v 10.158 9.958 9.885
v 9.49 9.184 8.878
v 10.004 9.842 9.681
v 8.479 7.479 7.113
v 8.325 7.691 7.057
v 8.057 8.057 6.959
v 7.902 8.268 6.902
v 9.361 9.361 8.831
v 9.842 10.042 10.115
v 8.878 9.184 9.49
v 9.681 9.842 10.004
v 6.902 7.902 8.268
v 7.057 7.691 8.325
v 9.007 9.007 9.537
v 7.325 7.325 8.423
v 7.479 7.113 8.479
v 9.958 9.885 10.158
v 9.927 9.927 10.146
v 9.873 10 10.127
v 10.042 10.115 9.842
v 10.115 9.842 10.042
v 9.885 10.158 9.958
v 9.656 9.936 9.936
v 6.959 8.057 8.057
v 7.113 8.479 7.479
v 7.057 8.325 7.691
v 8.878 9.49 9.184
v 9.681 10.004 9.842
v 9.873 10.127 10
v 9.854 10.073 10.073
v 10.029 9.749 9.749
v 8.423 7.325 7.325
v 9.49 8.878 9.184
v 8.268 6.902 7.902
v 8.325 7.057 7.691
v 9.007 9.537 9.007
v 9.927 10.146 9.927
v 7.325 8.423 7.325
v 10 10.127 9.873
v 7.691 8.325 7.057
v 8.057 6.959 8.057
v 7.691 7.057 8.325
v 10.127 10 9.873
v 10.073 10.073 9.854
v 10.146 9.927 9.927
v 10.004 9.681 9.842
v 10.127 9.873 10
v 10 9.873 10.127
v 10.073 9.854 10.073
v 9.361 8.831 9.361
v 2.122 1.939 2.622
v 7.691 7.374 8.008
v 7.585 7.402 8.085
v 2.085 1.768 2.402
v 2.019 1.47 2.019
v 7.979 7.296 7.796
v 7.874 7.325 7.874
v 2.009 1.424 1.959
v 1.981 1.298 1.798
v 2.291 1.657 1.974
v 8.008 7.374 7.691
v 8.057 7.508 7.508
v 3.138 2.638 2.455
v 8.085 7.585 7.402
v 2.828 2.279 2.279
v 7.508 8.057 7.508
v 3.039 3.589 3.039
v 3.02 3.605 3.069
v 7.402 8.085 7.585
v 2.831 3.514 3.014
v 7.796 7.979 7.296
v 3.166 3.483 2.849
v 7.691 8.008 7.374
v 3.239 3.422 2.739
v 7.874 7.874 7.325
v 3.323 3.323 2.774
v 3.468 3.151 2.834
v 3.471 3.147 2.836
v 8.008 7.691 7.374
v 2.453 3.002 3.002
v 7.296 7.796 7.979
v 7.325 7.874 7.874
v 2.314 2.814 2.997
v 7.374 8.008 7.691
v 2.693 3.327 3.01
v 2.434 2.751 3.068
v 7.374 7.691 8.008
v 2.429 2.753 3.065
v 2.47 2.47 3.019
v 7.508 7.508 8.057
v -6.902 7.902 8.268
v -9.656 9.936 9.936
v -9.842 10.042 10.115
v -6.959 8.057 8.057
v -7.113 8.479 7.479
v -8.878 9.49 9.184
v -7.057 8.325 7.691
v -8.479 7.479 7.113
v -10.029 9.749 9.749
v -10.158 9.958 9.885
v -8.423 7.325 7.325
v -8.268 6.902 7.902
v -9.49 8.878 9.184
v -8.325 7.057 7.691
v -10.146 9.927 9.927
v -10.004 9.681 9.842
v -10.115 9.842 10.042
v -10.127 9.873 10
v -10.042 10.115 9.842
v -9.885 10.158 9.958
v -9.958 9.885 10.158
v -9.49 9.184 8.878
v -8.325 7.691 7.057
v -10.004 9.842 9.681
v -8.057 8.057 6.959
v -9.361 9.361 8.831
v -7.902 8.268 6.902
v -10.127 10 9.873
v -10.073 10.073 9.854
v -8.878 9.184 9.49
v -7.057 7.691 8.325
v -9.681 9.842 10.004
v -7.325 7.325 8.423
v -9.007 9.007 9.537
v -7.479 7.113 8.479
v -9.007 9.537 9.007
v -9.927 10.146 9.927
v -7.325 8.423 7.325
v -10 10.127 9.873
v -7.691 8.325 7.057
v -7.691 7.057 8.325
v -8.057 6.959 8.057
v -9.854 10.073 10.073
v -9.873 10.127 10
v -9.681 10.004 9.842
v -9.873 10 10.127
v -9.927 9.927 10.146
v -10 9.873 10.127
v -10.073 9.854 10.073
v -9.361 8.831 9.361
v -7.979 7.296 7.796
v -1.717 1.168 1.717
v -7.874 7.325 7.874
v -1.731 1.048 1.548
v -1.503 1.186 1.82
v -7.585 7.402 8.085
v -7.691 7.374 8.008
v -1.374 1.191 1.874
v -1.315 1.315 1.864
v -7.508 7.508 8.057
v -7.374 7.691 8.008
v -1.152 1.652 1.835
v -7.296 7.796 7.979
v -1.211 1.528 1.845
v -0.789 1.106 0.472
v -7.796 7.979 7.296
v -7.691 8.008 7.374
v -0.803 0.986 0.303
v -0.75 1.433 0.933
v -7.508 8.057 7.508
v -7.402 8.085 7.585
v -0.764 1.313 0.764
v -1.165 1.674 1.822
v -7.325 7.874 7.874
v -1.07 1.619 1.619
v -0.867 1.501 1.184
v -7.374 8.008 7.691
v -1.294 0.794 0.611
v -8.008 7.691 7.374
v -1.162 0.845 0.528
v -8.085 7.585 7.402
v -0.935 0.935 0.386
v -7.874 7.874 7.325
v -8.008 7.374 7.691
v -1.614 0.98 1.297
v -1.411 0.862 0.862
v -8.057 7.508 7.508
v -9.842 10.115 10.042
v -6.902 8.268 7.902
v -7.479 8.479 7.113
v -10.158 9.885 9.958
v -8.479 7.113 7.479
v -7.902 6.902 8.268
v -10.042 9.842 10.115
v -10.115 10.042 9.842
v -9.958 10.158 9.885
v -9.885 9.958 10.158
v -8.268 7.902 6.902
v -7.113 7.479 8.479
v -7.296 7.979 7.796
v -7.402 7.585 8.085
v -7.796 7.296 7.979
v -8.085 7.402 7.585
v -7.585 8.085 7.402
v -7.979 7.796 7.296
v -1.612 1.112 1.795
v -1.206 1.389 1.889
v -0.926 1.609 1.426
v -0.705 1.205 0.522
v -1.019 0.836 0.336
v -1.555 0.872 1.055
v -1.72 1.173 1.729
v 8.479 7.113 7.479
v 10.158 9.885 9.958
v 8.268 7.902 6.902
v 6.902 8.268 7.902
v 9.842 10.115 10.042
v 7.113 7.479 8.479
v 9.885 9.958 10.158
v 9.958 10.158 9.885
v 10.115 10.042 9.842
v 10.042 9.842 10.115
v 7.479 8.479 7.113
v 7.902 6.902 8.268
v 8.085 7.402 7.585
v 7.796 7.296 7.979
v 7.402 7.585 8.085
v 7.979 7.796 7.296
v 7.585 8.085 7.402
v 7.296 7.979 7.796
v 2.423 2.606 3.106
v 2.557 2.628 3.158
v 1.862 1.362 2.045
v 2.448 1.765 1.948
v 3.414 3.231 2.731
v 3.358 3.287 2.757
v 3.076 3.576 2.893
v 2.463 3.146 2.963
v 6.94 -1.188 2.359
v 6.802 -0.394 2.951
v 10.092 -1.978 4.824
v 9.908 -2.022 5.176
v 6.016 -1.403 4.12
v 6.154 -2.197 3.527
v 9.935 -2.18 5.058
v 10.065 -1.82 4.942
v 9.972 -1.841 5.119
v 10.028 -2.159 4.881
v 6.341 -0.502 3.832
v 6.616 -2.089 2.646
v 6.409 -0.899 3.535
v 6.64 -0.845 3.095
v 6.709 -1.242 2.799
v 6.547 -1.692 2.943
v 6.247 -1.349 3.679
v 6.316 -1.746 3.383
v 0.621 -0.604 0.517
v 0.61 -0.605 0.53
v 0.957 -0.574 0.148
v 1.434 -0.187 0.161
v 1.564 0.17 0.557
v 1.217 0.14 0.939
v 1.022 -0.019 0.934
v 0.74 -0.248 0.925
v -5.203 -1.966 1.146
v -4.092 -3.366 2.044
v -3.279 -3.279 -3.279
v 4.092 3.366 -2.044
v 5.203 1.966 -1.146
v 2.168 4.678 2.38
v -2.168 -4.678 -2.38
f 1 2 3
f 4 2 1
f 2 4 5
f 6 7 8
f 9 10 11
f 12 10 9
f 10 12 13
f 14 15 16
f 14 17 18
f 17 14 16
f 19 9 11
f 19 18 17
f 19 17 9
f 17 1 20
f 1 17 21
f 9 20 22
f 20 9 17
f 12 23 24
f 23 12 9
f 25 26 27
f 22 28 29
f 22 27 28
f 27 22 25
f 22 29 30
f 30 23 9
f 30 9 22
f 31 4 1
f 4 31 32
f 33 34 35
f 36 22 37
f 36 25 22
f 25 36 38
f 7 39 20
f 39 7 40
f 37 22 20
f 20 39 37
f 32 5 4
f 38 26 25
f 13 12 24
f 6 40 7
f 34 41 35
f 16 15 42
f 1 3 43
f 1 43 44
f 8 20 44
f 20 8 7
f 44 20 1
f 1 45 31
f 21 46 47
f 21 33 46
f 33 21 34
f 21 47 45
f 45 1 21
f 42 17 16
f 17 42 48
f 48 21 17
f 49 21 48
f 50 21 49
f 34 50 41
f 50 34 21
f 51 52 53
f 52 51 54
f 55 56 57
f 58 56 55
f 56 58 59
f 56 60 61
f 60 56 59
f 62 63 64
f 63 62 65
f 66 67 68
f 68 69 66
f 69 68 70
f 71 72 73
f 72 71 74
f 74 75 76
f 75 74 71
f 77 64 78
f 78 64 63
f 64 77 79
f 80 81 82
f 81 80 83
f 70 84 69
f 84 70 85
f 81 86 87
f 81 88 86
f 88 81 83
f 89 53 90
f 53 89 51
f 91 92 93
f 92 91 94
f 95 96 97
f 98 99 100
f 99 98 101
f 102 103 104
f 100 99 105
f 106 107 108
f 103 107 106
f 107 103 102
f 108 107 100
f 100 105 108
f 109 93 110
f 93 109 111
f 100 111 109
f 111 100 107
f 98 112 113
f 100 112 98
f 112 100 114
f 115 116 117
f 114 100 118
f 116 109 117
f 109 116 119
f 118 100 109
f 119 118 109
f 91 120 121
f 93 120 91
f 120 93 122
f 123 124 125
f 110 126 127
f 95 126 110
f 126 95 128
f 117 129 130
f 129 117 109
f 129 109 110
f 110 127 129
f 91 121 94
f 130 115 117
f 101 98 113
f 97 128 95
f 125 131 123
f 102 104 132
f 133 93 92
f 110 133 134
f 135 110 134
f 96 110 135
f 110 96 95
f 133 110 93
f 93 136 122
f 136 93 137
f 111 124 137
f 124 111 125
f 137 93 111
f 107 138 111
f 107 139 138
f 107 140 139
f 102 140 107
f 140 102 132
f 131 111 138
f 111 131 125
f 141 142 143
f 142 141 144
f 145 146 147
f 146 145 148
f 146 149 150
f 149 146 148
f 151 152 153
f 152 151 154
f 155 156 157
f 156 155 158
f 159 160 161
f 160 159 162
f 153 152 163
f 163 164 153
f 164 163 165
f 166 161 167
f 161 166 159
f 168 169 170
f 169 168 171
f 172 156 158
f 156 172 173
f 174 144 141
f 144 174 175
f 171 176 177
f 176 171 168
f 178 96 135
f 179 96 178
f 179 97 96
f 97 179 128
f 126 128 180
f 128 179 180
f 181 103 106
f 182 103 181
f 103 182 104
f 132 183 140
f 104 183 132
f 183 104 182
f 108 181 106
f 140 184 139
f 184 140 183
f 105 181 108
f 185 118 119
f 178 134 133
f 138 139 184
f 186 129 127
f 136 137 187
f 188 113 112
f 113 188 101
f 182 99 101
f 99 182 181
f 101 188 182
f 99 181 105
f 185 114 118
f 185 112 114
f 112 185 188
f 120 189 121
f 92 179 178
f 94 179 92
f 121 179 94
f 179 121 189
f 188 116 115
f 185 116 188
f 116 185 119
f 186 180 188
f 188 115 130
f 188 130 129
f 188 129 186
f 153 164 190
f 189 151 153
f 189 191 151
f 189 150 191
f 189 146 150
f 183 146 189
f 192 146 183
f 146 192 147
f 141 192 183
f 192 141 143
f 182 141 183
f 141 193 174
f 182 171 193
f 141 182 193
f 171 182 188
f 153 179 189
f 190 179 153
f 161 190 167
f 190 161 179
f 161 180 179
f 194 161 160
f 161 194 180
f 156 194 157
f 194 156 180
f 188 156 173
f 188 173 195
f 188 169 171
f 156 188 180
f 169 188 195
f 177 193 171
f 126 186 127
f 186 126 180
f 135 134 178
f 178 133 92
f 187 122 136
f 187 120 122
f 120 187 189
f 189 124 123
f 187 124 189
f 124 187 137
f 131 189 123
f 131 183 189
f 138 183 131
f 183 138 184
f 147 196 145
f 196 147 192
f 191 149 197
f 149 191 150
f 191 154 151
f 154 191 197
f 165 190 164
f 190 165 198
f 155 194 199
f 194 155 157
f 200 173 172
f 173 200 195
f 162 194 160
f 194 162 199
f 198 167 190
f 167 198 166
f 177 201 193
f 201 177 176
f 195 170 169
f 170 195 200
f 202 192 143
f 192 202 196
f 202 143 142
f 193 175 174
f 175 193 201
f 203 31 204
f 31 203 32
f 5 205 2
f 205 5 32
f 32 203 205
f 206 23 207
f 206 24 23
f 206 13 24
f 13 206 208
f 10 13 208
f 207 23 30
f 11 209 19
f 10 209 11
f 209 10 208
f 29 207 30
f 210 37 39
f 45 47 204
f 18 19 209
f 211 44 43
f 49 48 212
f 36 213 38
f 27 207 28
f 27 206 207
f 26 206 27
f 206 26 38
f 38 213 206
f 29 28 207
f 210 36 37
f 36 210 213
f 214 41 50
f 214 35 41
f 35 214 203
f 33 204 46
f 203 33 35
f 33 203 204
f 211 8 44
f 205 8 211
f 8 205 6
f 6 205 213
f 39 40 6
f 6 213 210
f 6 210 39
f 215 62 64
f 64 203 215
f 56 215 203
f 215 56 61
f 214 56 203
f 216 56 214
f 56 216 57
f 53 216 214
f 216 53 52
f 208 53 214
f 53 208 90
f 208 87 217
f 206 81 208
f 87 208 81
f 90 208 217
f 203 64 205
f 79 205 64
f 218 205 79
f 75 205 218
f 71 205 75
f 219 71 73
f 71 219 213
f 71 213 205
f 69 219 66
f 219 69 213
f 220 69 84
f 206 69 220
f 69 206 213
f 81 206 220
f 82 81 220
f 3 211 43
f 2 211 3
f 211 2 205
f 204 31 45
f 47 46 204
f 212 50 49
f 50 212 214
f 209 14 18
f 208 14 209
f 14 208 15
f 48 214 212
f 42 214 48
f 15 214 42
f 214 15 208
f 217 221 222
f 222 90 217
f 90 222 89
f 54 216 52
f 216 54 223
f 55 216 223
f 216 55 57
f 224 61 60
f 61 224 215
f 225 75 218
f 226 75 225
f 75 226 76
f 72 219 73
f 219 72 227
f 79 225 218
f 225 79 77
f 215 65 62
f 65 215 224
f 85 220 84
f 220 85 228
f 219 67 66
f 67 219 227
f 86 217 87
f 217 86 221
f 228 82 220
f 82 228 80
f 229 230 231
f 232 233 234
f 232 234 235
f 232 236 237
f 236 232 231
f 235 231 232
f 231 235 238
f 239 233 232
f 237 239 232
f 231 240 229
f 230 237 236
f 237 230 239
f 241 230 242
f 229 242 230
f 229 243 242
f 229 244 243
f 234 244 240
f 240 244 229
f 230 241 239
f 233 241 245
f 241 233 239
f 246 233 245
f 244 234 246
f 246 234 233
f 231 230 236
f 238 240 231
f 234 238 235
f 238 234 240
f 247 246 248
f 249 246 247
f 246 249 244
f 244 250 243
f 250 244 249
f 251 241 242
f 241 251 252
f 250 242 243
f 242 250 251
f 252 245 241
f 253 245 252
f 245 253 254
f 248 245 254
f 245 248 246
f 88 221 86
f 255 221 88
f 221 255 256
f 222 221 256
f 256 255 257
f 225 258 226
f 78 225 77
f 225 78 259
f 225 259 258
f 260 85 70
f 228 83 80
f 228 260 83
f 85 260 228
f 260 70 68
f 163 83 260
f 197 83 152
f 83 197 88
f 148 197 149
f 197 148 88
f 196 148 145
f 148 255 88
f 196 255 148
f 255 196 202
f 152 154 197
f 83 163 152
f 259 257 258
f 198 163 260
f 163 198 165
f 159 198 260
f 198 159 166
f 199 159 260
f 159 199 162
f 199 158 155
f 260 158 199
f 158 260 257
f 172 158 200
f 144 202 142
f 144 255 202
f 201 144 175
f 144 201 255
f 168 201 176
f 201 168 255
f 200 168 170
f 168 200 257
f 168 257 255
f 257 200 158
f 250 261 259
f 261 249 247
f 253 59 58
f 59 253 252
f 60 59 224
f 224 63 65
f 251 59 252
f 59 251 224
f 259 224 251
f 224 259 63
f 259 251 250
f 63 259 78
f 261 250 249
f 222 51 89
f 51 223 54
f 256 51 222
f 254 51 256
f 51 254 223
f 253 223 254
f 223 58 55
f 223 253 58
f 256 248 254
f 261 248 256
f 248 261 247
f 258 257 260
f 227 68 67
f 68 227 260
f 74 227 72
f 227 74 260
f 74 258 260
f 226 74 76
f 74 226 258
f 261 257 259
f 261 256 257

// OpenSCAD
//---------------------------------------------------------------
//-- Openscad vector library
//-- This is a component of the obiscad opescad tools by Obijuan
//-- (C) Juan Gonzalez-Gomez (Obijuan)
//-- Sep-2012
//---------------------------------------------------------------
//-- Released under the GPL license
//---------------------------------------------------------------

obiscad_drawing_resolution = 6;

//----------------------------------------
//-- FUNCTIONS FOR WORKING WITH VECTORS
//----------------------------------------

//-- Calculate the module of a vector
function mod(v) = (sqrt(v[0]*v[0]+v[1]*v[1]+v[2]*v[2]));

//-- Calculate the cros product of two vectors
function cross(u,v) = [
  u[1]*v[2] - v[1]*u[2],
  -(u[0]*v[2] - v[0]*u[2]) ,
  u[0]*v[1] - v[0]*u[1]];

//-- Calculate the dot product of two vectors
function dot(u,v) = u[0]*v[0]+u[1]*v[1]+u[2]*v[2];

//-- Return the unit vector of a vector
function unitv(v) = v/mod(v);

//-- Return the angle between two vectores
function anglev(u,v) = acos( dot(u,v) / (mod(u)*mod(v)) );

//-- Return an arbitrary unitary vector othogonal to v
function orthounit2(v) = (v.x == 0 && v.y == 0 && v.z ==0 ) ? undef : (v.x == 0 && v.y == 0) ? [1,0,0] : let (r=norm([v.x, v.y, 0])) [v.y/r, -v.x/r, 0];

//-- Return an arbitrary vector othogonal to v
function ortho2(v) = (v.x == 0 && v.y == 0 && v.z== 0) ? undef : (v.x == 0 && v.y == 0) ? [1,0,0] : (v.y == 0) ? [1,0,0] : [1, -v.x/v.y, 0];

//----------------------------------------------------------
//--  Draw a point in the position given by the vector p  
//----------------------------------------------------------
module point(p)
{
  translate(p)
    sphere(r=0.7,$fn=obiscad_drawing_resolution);
}

//------------------------------------------------------------------
//-- Draw a vector poiting to the z axis
//-- This is an auxiliary module for implementing the vector module
//--
//-- Parameters:
//--  l: total vector length (line + arrow)
//--  l_arrow: Vector arrow length
//--  mark: If true, a mark is draw in the vector head, for having
//--    a visual reference of the rolling angle
//------------------------------------------------------------------
module vectorz(l=10, l_arrow=4, mark=false)
{
  //-- vector body length (not including the arrow)
  lb = l - l_arrow;

  //-- The vector is locatead at 0,0,0
  translate([0,0,lb/2])
  union() {

    //-- Draw the arrow
    translate([0,0,lb/2])
      cylinder(r1=2/2, r2=0.2, h=l_arrow, $fn=obiscad_drawing_resolution);

    //-- Draw the mark
    if (mark) {
      translate([0,0,lb/2+l_arrow/2])
      translate([1,0,0])
        cube([2,0.3,l_arrow*0.8],center=true);
    }

    //-- Draw the body
    cylinder(r=1/2, h=lb, center=true, $fn=obiscad_drawing_resolution);
  }

  //-- Draw a sphere in the vector base
  sphere(r=1/2, $fn=obiscad_drawing_resolution);
}

//-----------------------------------------------------------------
//-- ORIENTATE OPERATOR
//--
//--  Orientate an object to the direction given by the vector v
//--  Parameters:
//--    v : Target orientation
//--    vref: Vector reference. It is the vector of the local frame
//--          of the object that want to be poiting in the direction
//--          of v
//--    roll: Rotation of the object around the v axis
//-------------------------------------------------------------------
module orientate(v,vref=[0,0,1], roll=0)
{
  //-- Calculate the rotation axis
  cref = cross(vref, v);
  raxis = mod(cref) == 0 ? [1,0,0] : cref;
  
  //-- Calculate the angle between the vectors
  ang = anglev(vref,v);

  //-- Rotate the child!
  rotate(a=roll, v=v)
    rotate(a=ang, v=raxis)
      children(0);
}

//---------------------------------------------------------------------------
//-- Draw a vector 
//--
//-- There are two modes of drawing the vector
//-- * Mode 1: Given by a cartesian point(x,y,z). A vector from the origin
//--           to the end (x,y,z) is drawn. The l parameter (length) must 
//--           be 0  (l=0)
//-- * Mode 2: Give by direction and length
//--           A vector of length l pointing to the direction given by
//--           v is drawn
//---------------------------------------------------------------------------
//-- Parameters:
//--  v: Vector cartesian coordinates
//--  l: total vector length (line + arrow)
//--  l_arrow: Vector arrow length
//    mark: If true, a mark is draw in the vector head, for having
//--    a visual reference of the rolling angle
//---------------------------------------------------------------------------
module vector(v,l=0, l_arrow=4, mark=false)
{
  //-- Get the vector length from the coordinates
  mod = mod(v);

  //-- The vector is very easy implemented by means of the orientate
  //-- operator:
  //--  orientate(v) vectorz(l=mod, l_arrow=l_arrow)
  //--  BUT... in OPENSCAD 2012.02.22 the recursion does not
  //--    not work, so that if the user use the orientate operator
  //--    on a vector, openscad will ignore it..
  //-- The solution at the moment (I hope the openscad developers
  //--  implement the recursion in the near future...)
  //--  is to repite the orientate operation in this module

  //---- SAME CALCULATIONS THAN THE ORIENTATE OPERATOR!
  //-- Calculate the rotation axis

  vref = [0,0,1];
  cref = cross(vref, v);
  raxis = mod(cref) == 0 ? [1,0,0] : cref;
  
  //-- Calculate the angle between the vectors
  ang = anglev(vref,v);

  //-- orientate the vector
  //-- Draw the vector. The vector length is given either
  //--- by the mod variable (when l=0) or by l (when l!=0)
  if (l==0)
    rotate(a=ang, v=raxis)
      vectorz(l=mod, l_arrow=l_arrow, mark=mark);
  else
    rotate(a=ang, v=raxis)
      vectorz(l=l, l_arrow=l_arrow, mark=mark);

}

//----------------------------------------------------
//-- Draw a Frame of reference
//-- Parameters:
//-- l: length of the Unit vectors
//-----------------------------------------------------
module frame(l=10, l_arrow=4)
{

  //-- Z unit vector
  color("Blue")
    vector([0,0,l], l_arrow=l_arrow);

  //-- X unit vector
  color("Red")
    vector([l,0,0], l_arrow=l_arrow );

  //-- Y unit vector
  color("Green")
    vector([0,l,0],l_arrow=l_arrow);

  //-- Origin
  color("Gray")
    sphere(r=1, $fn=obiscad_drawing_resolution);
}

//--------------------------------------------------
//-- Modules for testings and examples
//-- Testing that the vector library is working ok
//--------------------------------------------------

//-- 22 vectors in total are drawn, poiting to different directions
module Test_vectors1()
{

  a = 20;
  k = 1;

  //--  Add a frame of reference (in the origin)
  frame(l=a);

  //-- Negative vectors, pointing towards the three axis: -x, -y, -z
  color("Red")   vector([-a, 0,  0]);
  color("Green") vector([0, -a,  0]);
  color("Blue")  vector([0,  0, -a]);

  //-- It is *not* has been implemented using a for loop on purpose
  //-- This way, individual vectors can be commented out or highlighted

  //-- vectors with positive z
  vector([a,   a, a*k]);
  vector([0,   a, a*k]);
  vector([-a,  a, a*k]);
  vector([-a,  0, a*k]);

  vector([-a, -a, a*k]);
  vector([0,  -a, a*k]);
  vector([a,  -a, a*k]);
  vector([a,   0, a*k]);


  //-- Vectors with negative z
  vector([a,   a, -a*k]);
  vector([0,   a, -a*k]);
  vector([-a,  a, -a*k]);
  vector([-a,  0, -a*k]);

  vector([-a, -a, -a*k]);
  vector([0,  -a, -a*k]);
  vector([a,  -a, -a*k]);
  vector([a,   0, -a*k]);
}

//--- Another test...
module Test_vectors2()
{

  //-- Add the vector into the vector table
  //-- This vectors are taken as directions
  //-- All the vectors will be drawn with the same length (l)
  vector_table = [
    [1,   1, 1],
    [0,   1, 1],
    [-1,  1, 1],
    [-1,  0, 1],
    [-1, -1, 1],
    [0,  -1, 1],
    [1,  -1, 1],
    [1,   0, 1],
    [0,   0, -1], // degenerate case 
    [1,   1, -1],
    [0,   1, -1],
    [-1,  1, -1],
    [-1,  0, -1],
    [-1, -1, -1],
    [0,  -1, -1],
    [1,  -1, -1],
    [1,   0, -1],
  ];

  //-- Vector length
  l=20;

  frame(l=10);

  //-- Draw all the vector given in the table
  //-- The vectors point to the direction given in the table
  //-- They all are drawn with a length equal to l
  for (v=vector_table) {
    //-- Vector given by direction and length
    vector(v,l=l);
  }
}


//-- Test the cross product and the angle
//-- between vectors
module Test_vector3()
{
  //-- Start with 2 unit vectors
  v=unitv([1,1,1]);
  u=unitv([0,1,0]);

  //-- Draw the vector in different colors
  //-- Increase the length for drawing
  color("Red") vector(v*20);
  color("blue") vector(u*20);

  //-- Get the cross product
  w = cross(v,u);
  vector(w*20);

  //-- The cross product is NOT conmutative... 
  //-- change the order of v and u
  w2 = cross(u,v);
  vector(w2*20);

  //-- w should be perpendicular to v and u
  //-- Calculate the angles between them:
  echo("U , V: ", anglev(u,v));
  echo("W , U: ", anglev(w,u));
  echo("W , V: ", anglev(w,v));

}

//-- Test the orientate operator
module Test_vector4()
{
  o = [10,10,10];
  v = [-10,10,10];

  color("Red") vector(o);
  color("Blue") vector(v);

  //-- Orientate the vector o in the direction of v
  orientate(v,o)
    vector(o);

  //-- Inverse operation: orientate the v vector in the direction
  //-- of o
  orientate(o,v)
    vector(v);

  //-- Example of orientation of a cube
  orientate(o,vref=[10,-2,5],roll=0)
    cube([10,2,5],center=true);

  vector([10,-2,5]);

}

//-- Test the degenerate case ie. the vectors are (anti)collinear
module Test_vector5()
{
  o = [0,0,10];
  v = [0,0,-10];

  color("Red") vector(o);
  color("Blue") vector(v);

  //-- Orientate the vector o in the direction of v
  orientate(v,o)
    vector(o);

  //-- Inverse operation: orientate the v vector in the direction
  //-- of o
  orientate(o,v)
    vector(v);
}

//-------- Perform tests......

Test_vector4();


/*

Test_vectors1();


translate([60,0,0]) 
  Test_vectors2();
*/
